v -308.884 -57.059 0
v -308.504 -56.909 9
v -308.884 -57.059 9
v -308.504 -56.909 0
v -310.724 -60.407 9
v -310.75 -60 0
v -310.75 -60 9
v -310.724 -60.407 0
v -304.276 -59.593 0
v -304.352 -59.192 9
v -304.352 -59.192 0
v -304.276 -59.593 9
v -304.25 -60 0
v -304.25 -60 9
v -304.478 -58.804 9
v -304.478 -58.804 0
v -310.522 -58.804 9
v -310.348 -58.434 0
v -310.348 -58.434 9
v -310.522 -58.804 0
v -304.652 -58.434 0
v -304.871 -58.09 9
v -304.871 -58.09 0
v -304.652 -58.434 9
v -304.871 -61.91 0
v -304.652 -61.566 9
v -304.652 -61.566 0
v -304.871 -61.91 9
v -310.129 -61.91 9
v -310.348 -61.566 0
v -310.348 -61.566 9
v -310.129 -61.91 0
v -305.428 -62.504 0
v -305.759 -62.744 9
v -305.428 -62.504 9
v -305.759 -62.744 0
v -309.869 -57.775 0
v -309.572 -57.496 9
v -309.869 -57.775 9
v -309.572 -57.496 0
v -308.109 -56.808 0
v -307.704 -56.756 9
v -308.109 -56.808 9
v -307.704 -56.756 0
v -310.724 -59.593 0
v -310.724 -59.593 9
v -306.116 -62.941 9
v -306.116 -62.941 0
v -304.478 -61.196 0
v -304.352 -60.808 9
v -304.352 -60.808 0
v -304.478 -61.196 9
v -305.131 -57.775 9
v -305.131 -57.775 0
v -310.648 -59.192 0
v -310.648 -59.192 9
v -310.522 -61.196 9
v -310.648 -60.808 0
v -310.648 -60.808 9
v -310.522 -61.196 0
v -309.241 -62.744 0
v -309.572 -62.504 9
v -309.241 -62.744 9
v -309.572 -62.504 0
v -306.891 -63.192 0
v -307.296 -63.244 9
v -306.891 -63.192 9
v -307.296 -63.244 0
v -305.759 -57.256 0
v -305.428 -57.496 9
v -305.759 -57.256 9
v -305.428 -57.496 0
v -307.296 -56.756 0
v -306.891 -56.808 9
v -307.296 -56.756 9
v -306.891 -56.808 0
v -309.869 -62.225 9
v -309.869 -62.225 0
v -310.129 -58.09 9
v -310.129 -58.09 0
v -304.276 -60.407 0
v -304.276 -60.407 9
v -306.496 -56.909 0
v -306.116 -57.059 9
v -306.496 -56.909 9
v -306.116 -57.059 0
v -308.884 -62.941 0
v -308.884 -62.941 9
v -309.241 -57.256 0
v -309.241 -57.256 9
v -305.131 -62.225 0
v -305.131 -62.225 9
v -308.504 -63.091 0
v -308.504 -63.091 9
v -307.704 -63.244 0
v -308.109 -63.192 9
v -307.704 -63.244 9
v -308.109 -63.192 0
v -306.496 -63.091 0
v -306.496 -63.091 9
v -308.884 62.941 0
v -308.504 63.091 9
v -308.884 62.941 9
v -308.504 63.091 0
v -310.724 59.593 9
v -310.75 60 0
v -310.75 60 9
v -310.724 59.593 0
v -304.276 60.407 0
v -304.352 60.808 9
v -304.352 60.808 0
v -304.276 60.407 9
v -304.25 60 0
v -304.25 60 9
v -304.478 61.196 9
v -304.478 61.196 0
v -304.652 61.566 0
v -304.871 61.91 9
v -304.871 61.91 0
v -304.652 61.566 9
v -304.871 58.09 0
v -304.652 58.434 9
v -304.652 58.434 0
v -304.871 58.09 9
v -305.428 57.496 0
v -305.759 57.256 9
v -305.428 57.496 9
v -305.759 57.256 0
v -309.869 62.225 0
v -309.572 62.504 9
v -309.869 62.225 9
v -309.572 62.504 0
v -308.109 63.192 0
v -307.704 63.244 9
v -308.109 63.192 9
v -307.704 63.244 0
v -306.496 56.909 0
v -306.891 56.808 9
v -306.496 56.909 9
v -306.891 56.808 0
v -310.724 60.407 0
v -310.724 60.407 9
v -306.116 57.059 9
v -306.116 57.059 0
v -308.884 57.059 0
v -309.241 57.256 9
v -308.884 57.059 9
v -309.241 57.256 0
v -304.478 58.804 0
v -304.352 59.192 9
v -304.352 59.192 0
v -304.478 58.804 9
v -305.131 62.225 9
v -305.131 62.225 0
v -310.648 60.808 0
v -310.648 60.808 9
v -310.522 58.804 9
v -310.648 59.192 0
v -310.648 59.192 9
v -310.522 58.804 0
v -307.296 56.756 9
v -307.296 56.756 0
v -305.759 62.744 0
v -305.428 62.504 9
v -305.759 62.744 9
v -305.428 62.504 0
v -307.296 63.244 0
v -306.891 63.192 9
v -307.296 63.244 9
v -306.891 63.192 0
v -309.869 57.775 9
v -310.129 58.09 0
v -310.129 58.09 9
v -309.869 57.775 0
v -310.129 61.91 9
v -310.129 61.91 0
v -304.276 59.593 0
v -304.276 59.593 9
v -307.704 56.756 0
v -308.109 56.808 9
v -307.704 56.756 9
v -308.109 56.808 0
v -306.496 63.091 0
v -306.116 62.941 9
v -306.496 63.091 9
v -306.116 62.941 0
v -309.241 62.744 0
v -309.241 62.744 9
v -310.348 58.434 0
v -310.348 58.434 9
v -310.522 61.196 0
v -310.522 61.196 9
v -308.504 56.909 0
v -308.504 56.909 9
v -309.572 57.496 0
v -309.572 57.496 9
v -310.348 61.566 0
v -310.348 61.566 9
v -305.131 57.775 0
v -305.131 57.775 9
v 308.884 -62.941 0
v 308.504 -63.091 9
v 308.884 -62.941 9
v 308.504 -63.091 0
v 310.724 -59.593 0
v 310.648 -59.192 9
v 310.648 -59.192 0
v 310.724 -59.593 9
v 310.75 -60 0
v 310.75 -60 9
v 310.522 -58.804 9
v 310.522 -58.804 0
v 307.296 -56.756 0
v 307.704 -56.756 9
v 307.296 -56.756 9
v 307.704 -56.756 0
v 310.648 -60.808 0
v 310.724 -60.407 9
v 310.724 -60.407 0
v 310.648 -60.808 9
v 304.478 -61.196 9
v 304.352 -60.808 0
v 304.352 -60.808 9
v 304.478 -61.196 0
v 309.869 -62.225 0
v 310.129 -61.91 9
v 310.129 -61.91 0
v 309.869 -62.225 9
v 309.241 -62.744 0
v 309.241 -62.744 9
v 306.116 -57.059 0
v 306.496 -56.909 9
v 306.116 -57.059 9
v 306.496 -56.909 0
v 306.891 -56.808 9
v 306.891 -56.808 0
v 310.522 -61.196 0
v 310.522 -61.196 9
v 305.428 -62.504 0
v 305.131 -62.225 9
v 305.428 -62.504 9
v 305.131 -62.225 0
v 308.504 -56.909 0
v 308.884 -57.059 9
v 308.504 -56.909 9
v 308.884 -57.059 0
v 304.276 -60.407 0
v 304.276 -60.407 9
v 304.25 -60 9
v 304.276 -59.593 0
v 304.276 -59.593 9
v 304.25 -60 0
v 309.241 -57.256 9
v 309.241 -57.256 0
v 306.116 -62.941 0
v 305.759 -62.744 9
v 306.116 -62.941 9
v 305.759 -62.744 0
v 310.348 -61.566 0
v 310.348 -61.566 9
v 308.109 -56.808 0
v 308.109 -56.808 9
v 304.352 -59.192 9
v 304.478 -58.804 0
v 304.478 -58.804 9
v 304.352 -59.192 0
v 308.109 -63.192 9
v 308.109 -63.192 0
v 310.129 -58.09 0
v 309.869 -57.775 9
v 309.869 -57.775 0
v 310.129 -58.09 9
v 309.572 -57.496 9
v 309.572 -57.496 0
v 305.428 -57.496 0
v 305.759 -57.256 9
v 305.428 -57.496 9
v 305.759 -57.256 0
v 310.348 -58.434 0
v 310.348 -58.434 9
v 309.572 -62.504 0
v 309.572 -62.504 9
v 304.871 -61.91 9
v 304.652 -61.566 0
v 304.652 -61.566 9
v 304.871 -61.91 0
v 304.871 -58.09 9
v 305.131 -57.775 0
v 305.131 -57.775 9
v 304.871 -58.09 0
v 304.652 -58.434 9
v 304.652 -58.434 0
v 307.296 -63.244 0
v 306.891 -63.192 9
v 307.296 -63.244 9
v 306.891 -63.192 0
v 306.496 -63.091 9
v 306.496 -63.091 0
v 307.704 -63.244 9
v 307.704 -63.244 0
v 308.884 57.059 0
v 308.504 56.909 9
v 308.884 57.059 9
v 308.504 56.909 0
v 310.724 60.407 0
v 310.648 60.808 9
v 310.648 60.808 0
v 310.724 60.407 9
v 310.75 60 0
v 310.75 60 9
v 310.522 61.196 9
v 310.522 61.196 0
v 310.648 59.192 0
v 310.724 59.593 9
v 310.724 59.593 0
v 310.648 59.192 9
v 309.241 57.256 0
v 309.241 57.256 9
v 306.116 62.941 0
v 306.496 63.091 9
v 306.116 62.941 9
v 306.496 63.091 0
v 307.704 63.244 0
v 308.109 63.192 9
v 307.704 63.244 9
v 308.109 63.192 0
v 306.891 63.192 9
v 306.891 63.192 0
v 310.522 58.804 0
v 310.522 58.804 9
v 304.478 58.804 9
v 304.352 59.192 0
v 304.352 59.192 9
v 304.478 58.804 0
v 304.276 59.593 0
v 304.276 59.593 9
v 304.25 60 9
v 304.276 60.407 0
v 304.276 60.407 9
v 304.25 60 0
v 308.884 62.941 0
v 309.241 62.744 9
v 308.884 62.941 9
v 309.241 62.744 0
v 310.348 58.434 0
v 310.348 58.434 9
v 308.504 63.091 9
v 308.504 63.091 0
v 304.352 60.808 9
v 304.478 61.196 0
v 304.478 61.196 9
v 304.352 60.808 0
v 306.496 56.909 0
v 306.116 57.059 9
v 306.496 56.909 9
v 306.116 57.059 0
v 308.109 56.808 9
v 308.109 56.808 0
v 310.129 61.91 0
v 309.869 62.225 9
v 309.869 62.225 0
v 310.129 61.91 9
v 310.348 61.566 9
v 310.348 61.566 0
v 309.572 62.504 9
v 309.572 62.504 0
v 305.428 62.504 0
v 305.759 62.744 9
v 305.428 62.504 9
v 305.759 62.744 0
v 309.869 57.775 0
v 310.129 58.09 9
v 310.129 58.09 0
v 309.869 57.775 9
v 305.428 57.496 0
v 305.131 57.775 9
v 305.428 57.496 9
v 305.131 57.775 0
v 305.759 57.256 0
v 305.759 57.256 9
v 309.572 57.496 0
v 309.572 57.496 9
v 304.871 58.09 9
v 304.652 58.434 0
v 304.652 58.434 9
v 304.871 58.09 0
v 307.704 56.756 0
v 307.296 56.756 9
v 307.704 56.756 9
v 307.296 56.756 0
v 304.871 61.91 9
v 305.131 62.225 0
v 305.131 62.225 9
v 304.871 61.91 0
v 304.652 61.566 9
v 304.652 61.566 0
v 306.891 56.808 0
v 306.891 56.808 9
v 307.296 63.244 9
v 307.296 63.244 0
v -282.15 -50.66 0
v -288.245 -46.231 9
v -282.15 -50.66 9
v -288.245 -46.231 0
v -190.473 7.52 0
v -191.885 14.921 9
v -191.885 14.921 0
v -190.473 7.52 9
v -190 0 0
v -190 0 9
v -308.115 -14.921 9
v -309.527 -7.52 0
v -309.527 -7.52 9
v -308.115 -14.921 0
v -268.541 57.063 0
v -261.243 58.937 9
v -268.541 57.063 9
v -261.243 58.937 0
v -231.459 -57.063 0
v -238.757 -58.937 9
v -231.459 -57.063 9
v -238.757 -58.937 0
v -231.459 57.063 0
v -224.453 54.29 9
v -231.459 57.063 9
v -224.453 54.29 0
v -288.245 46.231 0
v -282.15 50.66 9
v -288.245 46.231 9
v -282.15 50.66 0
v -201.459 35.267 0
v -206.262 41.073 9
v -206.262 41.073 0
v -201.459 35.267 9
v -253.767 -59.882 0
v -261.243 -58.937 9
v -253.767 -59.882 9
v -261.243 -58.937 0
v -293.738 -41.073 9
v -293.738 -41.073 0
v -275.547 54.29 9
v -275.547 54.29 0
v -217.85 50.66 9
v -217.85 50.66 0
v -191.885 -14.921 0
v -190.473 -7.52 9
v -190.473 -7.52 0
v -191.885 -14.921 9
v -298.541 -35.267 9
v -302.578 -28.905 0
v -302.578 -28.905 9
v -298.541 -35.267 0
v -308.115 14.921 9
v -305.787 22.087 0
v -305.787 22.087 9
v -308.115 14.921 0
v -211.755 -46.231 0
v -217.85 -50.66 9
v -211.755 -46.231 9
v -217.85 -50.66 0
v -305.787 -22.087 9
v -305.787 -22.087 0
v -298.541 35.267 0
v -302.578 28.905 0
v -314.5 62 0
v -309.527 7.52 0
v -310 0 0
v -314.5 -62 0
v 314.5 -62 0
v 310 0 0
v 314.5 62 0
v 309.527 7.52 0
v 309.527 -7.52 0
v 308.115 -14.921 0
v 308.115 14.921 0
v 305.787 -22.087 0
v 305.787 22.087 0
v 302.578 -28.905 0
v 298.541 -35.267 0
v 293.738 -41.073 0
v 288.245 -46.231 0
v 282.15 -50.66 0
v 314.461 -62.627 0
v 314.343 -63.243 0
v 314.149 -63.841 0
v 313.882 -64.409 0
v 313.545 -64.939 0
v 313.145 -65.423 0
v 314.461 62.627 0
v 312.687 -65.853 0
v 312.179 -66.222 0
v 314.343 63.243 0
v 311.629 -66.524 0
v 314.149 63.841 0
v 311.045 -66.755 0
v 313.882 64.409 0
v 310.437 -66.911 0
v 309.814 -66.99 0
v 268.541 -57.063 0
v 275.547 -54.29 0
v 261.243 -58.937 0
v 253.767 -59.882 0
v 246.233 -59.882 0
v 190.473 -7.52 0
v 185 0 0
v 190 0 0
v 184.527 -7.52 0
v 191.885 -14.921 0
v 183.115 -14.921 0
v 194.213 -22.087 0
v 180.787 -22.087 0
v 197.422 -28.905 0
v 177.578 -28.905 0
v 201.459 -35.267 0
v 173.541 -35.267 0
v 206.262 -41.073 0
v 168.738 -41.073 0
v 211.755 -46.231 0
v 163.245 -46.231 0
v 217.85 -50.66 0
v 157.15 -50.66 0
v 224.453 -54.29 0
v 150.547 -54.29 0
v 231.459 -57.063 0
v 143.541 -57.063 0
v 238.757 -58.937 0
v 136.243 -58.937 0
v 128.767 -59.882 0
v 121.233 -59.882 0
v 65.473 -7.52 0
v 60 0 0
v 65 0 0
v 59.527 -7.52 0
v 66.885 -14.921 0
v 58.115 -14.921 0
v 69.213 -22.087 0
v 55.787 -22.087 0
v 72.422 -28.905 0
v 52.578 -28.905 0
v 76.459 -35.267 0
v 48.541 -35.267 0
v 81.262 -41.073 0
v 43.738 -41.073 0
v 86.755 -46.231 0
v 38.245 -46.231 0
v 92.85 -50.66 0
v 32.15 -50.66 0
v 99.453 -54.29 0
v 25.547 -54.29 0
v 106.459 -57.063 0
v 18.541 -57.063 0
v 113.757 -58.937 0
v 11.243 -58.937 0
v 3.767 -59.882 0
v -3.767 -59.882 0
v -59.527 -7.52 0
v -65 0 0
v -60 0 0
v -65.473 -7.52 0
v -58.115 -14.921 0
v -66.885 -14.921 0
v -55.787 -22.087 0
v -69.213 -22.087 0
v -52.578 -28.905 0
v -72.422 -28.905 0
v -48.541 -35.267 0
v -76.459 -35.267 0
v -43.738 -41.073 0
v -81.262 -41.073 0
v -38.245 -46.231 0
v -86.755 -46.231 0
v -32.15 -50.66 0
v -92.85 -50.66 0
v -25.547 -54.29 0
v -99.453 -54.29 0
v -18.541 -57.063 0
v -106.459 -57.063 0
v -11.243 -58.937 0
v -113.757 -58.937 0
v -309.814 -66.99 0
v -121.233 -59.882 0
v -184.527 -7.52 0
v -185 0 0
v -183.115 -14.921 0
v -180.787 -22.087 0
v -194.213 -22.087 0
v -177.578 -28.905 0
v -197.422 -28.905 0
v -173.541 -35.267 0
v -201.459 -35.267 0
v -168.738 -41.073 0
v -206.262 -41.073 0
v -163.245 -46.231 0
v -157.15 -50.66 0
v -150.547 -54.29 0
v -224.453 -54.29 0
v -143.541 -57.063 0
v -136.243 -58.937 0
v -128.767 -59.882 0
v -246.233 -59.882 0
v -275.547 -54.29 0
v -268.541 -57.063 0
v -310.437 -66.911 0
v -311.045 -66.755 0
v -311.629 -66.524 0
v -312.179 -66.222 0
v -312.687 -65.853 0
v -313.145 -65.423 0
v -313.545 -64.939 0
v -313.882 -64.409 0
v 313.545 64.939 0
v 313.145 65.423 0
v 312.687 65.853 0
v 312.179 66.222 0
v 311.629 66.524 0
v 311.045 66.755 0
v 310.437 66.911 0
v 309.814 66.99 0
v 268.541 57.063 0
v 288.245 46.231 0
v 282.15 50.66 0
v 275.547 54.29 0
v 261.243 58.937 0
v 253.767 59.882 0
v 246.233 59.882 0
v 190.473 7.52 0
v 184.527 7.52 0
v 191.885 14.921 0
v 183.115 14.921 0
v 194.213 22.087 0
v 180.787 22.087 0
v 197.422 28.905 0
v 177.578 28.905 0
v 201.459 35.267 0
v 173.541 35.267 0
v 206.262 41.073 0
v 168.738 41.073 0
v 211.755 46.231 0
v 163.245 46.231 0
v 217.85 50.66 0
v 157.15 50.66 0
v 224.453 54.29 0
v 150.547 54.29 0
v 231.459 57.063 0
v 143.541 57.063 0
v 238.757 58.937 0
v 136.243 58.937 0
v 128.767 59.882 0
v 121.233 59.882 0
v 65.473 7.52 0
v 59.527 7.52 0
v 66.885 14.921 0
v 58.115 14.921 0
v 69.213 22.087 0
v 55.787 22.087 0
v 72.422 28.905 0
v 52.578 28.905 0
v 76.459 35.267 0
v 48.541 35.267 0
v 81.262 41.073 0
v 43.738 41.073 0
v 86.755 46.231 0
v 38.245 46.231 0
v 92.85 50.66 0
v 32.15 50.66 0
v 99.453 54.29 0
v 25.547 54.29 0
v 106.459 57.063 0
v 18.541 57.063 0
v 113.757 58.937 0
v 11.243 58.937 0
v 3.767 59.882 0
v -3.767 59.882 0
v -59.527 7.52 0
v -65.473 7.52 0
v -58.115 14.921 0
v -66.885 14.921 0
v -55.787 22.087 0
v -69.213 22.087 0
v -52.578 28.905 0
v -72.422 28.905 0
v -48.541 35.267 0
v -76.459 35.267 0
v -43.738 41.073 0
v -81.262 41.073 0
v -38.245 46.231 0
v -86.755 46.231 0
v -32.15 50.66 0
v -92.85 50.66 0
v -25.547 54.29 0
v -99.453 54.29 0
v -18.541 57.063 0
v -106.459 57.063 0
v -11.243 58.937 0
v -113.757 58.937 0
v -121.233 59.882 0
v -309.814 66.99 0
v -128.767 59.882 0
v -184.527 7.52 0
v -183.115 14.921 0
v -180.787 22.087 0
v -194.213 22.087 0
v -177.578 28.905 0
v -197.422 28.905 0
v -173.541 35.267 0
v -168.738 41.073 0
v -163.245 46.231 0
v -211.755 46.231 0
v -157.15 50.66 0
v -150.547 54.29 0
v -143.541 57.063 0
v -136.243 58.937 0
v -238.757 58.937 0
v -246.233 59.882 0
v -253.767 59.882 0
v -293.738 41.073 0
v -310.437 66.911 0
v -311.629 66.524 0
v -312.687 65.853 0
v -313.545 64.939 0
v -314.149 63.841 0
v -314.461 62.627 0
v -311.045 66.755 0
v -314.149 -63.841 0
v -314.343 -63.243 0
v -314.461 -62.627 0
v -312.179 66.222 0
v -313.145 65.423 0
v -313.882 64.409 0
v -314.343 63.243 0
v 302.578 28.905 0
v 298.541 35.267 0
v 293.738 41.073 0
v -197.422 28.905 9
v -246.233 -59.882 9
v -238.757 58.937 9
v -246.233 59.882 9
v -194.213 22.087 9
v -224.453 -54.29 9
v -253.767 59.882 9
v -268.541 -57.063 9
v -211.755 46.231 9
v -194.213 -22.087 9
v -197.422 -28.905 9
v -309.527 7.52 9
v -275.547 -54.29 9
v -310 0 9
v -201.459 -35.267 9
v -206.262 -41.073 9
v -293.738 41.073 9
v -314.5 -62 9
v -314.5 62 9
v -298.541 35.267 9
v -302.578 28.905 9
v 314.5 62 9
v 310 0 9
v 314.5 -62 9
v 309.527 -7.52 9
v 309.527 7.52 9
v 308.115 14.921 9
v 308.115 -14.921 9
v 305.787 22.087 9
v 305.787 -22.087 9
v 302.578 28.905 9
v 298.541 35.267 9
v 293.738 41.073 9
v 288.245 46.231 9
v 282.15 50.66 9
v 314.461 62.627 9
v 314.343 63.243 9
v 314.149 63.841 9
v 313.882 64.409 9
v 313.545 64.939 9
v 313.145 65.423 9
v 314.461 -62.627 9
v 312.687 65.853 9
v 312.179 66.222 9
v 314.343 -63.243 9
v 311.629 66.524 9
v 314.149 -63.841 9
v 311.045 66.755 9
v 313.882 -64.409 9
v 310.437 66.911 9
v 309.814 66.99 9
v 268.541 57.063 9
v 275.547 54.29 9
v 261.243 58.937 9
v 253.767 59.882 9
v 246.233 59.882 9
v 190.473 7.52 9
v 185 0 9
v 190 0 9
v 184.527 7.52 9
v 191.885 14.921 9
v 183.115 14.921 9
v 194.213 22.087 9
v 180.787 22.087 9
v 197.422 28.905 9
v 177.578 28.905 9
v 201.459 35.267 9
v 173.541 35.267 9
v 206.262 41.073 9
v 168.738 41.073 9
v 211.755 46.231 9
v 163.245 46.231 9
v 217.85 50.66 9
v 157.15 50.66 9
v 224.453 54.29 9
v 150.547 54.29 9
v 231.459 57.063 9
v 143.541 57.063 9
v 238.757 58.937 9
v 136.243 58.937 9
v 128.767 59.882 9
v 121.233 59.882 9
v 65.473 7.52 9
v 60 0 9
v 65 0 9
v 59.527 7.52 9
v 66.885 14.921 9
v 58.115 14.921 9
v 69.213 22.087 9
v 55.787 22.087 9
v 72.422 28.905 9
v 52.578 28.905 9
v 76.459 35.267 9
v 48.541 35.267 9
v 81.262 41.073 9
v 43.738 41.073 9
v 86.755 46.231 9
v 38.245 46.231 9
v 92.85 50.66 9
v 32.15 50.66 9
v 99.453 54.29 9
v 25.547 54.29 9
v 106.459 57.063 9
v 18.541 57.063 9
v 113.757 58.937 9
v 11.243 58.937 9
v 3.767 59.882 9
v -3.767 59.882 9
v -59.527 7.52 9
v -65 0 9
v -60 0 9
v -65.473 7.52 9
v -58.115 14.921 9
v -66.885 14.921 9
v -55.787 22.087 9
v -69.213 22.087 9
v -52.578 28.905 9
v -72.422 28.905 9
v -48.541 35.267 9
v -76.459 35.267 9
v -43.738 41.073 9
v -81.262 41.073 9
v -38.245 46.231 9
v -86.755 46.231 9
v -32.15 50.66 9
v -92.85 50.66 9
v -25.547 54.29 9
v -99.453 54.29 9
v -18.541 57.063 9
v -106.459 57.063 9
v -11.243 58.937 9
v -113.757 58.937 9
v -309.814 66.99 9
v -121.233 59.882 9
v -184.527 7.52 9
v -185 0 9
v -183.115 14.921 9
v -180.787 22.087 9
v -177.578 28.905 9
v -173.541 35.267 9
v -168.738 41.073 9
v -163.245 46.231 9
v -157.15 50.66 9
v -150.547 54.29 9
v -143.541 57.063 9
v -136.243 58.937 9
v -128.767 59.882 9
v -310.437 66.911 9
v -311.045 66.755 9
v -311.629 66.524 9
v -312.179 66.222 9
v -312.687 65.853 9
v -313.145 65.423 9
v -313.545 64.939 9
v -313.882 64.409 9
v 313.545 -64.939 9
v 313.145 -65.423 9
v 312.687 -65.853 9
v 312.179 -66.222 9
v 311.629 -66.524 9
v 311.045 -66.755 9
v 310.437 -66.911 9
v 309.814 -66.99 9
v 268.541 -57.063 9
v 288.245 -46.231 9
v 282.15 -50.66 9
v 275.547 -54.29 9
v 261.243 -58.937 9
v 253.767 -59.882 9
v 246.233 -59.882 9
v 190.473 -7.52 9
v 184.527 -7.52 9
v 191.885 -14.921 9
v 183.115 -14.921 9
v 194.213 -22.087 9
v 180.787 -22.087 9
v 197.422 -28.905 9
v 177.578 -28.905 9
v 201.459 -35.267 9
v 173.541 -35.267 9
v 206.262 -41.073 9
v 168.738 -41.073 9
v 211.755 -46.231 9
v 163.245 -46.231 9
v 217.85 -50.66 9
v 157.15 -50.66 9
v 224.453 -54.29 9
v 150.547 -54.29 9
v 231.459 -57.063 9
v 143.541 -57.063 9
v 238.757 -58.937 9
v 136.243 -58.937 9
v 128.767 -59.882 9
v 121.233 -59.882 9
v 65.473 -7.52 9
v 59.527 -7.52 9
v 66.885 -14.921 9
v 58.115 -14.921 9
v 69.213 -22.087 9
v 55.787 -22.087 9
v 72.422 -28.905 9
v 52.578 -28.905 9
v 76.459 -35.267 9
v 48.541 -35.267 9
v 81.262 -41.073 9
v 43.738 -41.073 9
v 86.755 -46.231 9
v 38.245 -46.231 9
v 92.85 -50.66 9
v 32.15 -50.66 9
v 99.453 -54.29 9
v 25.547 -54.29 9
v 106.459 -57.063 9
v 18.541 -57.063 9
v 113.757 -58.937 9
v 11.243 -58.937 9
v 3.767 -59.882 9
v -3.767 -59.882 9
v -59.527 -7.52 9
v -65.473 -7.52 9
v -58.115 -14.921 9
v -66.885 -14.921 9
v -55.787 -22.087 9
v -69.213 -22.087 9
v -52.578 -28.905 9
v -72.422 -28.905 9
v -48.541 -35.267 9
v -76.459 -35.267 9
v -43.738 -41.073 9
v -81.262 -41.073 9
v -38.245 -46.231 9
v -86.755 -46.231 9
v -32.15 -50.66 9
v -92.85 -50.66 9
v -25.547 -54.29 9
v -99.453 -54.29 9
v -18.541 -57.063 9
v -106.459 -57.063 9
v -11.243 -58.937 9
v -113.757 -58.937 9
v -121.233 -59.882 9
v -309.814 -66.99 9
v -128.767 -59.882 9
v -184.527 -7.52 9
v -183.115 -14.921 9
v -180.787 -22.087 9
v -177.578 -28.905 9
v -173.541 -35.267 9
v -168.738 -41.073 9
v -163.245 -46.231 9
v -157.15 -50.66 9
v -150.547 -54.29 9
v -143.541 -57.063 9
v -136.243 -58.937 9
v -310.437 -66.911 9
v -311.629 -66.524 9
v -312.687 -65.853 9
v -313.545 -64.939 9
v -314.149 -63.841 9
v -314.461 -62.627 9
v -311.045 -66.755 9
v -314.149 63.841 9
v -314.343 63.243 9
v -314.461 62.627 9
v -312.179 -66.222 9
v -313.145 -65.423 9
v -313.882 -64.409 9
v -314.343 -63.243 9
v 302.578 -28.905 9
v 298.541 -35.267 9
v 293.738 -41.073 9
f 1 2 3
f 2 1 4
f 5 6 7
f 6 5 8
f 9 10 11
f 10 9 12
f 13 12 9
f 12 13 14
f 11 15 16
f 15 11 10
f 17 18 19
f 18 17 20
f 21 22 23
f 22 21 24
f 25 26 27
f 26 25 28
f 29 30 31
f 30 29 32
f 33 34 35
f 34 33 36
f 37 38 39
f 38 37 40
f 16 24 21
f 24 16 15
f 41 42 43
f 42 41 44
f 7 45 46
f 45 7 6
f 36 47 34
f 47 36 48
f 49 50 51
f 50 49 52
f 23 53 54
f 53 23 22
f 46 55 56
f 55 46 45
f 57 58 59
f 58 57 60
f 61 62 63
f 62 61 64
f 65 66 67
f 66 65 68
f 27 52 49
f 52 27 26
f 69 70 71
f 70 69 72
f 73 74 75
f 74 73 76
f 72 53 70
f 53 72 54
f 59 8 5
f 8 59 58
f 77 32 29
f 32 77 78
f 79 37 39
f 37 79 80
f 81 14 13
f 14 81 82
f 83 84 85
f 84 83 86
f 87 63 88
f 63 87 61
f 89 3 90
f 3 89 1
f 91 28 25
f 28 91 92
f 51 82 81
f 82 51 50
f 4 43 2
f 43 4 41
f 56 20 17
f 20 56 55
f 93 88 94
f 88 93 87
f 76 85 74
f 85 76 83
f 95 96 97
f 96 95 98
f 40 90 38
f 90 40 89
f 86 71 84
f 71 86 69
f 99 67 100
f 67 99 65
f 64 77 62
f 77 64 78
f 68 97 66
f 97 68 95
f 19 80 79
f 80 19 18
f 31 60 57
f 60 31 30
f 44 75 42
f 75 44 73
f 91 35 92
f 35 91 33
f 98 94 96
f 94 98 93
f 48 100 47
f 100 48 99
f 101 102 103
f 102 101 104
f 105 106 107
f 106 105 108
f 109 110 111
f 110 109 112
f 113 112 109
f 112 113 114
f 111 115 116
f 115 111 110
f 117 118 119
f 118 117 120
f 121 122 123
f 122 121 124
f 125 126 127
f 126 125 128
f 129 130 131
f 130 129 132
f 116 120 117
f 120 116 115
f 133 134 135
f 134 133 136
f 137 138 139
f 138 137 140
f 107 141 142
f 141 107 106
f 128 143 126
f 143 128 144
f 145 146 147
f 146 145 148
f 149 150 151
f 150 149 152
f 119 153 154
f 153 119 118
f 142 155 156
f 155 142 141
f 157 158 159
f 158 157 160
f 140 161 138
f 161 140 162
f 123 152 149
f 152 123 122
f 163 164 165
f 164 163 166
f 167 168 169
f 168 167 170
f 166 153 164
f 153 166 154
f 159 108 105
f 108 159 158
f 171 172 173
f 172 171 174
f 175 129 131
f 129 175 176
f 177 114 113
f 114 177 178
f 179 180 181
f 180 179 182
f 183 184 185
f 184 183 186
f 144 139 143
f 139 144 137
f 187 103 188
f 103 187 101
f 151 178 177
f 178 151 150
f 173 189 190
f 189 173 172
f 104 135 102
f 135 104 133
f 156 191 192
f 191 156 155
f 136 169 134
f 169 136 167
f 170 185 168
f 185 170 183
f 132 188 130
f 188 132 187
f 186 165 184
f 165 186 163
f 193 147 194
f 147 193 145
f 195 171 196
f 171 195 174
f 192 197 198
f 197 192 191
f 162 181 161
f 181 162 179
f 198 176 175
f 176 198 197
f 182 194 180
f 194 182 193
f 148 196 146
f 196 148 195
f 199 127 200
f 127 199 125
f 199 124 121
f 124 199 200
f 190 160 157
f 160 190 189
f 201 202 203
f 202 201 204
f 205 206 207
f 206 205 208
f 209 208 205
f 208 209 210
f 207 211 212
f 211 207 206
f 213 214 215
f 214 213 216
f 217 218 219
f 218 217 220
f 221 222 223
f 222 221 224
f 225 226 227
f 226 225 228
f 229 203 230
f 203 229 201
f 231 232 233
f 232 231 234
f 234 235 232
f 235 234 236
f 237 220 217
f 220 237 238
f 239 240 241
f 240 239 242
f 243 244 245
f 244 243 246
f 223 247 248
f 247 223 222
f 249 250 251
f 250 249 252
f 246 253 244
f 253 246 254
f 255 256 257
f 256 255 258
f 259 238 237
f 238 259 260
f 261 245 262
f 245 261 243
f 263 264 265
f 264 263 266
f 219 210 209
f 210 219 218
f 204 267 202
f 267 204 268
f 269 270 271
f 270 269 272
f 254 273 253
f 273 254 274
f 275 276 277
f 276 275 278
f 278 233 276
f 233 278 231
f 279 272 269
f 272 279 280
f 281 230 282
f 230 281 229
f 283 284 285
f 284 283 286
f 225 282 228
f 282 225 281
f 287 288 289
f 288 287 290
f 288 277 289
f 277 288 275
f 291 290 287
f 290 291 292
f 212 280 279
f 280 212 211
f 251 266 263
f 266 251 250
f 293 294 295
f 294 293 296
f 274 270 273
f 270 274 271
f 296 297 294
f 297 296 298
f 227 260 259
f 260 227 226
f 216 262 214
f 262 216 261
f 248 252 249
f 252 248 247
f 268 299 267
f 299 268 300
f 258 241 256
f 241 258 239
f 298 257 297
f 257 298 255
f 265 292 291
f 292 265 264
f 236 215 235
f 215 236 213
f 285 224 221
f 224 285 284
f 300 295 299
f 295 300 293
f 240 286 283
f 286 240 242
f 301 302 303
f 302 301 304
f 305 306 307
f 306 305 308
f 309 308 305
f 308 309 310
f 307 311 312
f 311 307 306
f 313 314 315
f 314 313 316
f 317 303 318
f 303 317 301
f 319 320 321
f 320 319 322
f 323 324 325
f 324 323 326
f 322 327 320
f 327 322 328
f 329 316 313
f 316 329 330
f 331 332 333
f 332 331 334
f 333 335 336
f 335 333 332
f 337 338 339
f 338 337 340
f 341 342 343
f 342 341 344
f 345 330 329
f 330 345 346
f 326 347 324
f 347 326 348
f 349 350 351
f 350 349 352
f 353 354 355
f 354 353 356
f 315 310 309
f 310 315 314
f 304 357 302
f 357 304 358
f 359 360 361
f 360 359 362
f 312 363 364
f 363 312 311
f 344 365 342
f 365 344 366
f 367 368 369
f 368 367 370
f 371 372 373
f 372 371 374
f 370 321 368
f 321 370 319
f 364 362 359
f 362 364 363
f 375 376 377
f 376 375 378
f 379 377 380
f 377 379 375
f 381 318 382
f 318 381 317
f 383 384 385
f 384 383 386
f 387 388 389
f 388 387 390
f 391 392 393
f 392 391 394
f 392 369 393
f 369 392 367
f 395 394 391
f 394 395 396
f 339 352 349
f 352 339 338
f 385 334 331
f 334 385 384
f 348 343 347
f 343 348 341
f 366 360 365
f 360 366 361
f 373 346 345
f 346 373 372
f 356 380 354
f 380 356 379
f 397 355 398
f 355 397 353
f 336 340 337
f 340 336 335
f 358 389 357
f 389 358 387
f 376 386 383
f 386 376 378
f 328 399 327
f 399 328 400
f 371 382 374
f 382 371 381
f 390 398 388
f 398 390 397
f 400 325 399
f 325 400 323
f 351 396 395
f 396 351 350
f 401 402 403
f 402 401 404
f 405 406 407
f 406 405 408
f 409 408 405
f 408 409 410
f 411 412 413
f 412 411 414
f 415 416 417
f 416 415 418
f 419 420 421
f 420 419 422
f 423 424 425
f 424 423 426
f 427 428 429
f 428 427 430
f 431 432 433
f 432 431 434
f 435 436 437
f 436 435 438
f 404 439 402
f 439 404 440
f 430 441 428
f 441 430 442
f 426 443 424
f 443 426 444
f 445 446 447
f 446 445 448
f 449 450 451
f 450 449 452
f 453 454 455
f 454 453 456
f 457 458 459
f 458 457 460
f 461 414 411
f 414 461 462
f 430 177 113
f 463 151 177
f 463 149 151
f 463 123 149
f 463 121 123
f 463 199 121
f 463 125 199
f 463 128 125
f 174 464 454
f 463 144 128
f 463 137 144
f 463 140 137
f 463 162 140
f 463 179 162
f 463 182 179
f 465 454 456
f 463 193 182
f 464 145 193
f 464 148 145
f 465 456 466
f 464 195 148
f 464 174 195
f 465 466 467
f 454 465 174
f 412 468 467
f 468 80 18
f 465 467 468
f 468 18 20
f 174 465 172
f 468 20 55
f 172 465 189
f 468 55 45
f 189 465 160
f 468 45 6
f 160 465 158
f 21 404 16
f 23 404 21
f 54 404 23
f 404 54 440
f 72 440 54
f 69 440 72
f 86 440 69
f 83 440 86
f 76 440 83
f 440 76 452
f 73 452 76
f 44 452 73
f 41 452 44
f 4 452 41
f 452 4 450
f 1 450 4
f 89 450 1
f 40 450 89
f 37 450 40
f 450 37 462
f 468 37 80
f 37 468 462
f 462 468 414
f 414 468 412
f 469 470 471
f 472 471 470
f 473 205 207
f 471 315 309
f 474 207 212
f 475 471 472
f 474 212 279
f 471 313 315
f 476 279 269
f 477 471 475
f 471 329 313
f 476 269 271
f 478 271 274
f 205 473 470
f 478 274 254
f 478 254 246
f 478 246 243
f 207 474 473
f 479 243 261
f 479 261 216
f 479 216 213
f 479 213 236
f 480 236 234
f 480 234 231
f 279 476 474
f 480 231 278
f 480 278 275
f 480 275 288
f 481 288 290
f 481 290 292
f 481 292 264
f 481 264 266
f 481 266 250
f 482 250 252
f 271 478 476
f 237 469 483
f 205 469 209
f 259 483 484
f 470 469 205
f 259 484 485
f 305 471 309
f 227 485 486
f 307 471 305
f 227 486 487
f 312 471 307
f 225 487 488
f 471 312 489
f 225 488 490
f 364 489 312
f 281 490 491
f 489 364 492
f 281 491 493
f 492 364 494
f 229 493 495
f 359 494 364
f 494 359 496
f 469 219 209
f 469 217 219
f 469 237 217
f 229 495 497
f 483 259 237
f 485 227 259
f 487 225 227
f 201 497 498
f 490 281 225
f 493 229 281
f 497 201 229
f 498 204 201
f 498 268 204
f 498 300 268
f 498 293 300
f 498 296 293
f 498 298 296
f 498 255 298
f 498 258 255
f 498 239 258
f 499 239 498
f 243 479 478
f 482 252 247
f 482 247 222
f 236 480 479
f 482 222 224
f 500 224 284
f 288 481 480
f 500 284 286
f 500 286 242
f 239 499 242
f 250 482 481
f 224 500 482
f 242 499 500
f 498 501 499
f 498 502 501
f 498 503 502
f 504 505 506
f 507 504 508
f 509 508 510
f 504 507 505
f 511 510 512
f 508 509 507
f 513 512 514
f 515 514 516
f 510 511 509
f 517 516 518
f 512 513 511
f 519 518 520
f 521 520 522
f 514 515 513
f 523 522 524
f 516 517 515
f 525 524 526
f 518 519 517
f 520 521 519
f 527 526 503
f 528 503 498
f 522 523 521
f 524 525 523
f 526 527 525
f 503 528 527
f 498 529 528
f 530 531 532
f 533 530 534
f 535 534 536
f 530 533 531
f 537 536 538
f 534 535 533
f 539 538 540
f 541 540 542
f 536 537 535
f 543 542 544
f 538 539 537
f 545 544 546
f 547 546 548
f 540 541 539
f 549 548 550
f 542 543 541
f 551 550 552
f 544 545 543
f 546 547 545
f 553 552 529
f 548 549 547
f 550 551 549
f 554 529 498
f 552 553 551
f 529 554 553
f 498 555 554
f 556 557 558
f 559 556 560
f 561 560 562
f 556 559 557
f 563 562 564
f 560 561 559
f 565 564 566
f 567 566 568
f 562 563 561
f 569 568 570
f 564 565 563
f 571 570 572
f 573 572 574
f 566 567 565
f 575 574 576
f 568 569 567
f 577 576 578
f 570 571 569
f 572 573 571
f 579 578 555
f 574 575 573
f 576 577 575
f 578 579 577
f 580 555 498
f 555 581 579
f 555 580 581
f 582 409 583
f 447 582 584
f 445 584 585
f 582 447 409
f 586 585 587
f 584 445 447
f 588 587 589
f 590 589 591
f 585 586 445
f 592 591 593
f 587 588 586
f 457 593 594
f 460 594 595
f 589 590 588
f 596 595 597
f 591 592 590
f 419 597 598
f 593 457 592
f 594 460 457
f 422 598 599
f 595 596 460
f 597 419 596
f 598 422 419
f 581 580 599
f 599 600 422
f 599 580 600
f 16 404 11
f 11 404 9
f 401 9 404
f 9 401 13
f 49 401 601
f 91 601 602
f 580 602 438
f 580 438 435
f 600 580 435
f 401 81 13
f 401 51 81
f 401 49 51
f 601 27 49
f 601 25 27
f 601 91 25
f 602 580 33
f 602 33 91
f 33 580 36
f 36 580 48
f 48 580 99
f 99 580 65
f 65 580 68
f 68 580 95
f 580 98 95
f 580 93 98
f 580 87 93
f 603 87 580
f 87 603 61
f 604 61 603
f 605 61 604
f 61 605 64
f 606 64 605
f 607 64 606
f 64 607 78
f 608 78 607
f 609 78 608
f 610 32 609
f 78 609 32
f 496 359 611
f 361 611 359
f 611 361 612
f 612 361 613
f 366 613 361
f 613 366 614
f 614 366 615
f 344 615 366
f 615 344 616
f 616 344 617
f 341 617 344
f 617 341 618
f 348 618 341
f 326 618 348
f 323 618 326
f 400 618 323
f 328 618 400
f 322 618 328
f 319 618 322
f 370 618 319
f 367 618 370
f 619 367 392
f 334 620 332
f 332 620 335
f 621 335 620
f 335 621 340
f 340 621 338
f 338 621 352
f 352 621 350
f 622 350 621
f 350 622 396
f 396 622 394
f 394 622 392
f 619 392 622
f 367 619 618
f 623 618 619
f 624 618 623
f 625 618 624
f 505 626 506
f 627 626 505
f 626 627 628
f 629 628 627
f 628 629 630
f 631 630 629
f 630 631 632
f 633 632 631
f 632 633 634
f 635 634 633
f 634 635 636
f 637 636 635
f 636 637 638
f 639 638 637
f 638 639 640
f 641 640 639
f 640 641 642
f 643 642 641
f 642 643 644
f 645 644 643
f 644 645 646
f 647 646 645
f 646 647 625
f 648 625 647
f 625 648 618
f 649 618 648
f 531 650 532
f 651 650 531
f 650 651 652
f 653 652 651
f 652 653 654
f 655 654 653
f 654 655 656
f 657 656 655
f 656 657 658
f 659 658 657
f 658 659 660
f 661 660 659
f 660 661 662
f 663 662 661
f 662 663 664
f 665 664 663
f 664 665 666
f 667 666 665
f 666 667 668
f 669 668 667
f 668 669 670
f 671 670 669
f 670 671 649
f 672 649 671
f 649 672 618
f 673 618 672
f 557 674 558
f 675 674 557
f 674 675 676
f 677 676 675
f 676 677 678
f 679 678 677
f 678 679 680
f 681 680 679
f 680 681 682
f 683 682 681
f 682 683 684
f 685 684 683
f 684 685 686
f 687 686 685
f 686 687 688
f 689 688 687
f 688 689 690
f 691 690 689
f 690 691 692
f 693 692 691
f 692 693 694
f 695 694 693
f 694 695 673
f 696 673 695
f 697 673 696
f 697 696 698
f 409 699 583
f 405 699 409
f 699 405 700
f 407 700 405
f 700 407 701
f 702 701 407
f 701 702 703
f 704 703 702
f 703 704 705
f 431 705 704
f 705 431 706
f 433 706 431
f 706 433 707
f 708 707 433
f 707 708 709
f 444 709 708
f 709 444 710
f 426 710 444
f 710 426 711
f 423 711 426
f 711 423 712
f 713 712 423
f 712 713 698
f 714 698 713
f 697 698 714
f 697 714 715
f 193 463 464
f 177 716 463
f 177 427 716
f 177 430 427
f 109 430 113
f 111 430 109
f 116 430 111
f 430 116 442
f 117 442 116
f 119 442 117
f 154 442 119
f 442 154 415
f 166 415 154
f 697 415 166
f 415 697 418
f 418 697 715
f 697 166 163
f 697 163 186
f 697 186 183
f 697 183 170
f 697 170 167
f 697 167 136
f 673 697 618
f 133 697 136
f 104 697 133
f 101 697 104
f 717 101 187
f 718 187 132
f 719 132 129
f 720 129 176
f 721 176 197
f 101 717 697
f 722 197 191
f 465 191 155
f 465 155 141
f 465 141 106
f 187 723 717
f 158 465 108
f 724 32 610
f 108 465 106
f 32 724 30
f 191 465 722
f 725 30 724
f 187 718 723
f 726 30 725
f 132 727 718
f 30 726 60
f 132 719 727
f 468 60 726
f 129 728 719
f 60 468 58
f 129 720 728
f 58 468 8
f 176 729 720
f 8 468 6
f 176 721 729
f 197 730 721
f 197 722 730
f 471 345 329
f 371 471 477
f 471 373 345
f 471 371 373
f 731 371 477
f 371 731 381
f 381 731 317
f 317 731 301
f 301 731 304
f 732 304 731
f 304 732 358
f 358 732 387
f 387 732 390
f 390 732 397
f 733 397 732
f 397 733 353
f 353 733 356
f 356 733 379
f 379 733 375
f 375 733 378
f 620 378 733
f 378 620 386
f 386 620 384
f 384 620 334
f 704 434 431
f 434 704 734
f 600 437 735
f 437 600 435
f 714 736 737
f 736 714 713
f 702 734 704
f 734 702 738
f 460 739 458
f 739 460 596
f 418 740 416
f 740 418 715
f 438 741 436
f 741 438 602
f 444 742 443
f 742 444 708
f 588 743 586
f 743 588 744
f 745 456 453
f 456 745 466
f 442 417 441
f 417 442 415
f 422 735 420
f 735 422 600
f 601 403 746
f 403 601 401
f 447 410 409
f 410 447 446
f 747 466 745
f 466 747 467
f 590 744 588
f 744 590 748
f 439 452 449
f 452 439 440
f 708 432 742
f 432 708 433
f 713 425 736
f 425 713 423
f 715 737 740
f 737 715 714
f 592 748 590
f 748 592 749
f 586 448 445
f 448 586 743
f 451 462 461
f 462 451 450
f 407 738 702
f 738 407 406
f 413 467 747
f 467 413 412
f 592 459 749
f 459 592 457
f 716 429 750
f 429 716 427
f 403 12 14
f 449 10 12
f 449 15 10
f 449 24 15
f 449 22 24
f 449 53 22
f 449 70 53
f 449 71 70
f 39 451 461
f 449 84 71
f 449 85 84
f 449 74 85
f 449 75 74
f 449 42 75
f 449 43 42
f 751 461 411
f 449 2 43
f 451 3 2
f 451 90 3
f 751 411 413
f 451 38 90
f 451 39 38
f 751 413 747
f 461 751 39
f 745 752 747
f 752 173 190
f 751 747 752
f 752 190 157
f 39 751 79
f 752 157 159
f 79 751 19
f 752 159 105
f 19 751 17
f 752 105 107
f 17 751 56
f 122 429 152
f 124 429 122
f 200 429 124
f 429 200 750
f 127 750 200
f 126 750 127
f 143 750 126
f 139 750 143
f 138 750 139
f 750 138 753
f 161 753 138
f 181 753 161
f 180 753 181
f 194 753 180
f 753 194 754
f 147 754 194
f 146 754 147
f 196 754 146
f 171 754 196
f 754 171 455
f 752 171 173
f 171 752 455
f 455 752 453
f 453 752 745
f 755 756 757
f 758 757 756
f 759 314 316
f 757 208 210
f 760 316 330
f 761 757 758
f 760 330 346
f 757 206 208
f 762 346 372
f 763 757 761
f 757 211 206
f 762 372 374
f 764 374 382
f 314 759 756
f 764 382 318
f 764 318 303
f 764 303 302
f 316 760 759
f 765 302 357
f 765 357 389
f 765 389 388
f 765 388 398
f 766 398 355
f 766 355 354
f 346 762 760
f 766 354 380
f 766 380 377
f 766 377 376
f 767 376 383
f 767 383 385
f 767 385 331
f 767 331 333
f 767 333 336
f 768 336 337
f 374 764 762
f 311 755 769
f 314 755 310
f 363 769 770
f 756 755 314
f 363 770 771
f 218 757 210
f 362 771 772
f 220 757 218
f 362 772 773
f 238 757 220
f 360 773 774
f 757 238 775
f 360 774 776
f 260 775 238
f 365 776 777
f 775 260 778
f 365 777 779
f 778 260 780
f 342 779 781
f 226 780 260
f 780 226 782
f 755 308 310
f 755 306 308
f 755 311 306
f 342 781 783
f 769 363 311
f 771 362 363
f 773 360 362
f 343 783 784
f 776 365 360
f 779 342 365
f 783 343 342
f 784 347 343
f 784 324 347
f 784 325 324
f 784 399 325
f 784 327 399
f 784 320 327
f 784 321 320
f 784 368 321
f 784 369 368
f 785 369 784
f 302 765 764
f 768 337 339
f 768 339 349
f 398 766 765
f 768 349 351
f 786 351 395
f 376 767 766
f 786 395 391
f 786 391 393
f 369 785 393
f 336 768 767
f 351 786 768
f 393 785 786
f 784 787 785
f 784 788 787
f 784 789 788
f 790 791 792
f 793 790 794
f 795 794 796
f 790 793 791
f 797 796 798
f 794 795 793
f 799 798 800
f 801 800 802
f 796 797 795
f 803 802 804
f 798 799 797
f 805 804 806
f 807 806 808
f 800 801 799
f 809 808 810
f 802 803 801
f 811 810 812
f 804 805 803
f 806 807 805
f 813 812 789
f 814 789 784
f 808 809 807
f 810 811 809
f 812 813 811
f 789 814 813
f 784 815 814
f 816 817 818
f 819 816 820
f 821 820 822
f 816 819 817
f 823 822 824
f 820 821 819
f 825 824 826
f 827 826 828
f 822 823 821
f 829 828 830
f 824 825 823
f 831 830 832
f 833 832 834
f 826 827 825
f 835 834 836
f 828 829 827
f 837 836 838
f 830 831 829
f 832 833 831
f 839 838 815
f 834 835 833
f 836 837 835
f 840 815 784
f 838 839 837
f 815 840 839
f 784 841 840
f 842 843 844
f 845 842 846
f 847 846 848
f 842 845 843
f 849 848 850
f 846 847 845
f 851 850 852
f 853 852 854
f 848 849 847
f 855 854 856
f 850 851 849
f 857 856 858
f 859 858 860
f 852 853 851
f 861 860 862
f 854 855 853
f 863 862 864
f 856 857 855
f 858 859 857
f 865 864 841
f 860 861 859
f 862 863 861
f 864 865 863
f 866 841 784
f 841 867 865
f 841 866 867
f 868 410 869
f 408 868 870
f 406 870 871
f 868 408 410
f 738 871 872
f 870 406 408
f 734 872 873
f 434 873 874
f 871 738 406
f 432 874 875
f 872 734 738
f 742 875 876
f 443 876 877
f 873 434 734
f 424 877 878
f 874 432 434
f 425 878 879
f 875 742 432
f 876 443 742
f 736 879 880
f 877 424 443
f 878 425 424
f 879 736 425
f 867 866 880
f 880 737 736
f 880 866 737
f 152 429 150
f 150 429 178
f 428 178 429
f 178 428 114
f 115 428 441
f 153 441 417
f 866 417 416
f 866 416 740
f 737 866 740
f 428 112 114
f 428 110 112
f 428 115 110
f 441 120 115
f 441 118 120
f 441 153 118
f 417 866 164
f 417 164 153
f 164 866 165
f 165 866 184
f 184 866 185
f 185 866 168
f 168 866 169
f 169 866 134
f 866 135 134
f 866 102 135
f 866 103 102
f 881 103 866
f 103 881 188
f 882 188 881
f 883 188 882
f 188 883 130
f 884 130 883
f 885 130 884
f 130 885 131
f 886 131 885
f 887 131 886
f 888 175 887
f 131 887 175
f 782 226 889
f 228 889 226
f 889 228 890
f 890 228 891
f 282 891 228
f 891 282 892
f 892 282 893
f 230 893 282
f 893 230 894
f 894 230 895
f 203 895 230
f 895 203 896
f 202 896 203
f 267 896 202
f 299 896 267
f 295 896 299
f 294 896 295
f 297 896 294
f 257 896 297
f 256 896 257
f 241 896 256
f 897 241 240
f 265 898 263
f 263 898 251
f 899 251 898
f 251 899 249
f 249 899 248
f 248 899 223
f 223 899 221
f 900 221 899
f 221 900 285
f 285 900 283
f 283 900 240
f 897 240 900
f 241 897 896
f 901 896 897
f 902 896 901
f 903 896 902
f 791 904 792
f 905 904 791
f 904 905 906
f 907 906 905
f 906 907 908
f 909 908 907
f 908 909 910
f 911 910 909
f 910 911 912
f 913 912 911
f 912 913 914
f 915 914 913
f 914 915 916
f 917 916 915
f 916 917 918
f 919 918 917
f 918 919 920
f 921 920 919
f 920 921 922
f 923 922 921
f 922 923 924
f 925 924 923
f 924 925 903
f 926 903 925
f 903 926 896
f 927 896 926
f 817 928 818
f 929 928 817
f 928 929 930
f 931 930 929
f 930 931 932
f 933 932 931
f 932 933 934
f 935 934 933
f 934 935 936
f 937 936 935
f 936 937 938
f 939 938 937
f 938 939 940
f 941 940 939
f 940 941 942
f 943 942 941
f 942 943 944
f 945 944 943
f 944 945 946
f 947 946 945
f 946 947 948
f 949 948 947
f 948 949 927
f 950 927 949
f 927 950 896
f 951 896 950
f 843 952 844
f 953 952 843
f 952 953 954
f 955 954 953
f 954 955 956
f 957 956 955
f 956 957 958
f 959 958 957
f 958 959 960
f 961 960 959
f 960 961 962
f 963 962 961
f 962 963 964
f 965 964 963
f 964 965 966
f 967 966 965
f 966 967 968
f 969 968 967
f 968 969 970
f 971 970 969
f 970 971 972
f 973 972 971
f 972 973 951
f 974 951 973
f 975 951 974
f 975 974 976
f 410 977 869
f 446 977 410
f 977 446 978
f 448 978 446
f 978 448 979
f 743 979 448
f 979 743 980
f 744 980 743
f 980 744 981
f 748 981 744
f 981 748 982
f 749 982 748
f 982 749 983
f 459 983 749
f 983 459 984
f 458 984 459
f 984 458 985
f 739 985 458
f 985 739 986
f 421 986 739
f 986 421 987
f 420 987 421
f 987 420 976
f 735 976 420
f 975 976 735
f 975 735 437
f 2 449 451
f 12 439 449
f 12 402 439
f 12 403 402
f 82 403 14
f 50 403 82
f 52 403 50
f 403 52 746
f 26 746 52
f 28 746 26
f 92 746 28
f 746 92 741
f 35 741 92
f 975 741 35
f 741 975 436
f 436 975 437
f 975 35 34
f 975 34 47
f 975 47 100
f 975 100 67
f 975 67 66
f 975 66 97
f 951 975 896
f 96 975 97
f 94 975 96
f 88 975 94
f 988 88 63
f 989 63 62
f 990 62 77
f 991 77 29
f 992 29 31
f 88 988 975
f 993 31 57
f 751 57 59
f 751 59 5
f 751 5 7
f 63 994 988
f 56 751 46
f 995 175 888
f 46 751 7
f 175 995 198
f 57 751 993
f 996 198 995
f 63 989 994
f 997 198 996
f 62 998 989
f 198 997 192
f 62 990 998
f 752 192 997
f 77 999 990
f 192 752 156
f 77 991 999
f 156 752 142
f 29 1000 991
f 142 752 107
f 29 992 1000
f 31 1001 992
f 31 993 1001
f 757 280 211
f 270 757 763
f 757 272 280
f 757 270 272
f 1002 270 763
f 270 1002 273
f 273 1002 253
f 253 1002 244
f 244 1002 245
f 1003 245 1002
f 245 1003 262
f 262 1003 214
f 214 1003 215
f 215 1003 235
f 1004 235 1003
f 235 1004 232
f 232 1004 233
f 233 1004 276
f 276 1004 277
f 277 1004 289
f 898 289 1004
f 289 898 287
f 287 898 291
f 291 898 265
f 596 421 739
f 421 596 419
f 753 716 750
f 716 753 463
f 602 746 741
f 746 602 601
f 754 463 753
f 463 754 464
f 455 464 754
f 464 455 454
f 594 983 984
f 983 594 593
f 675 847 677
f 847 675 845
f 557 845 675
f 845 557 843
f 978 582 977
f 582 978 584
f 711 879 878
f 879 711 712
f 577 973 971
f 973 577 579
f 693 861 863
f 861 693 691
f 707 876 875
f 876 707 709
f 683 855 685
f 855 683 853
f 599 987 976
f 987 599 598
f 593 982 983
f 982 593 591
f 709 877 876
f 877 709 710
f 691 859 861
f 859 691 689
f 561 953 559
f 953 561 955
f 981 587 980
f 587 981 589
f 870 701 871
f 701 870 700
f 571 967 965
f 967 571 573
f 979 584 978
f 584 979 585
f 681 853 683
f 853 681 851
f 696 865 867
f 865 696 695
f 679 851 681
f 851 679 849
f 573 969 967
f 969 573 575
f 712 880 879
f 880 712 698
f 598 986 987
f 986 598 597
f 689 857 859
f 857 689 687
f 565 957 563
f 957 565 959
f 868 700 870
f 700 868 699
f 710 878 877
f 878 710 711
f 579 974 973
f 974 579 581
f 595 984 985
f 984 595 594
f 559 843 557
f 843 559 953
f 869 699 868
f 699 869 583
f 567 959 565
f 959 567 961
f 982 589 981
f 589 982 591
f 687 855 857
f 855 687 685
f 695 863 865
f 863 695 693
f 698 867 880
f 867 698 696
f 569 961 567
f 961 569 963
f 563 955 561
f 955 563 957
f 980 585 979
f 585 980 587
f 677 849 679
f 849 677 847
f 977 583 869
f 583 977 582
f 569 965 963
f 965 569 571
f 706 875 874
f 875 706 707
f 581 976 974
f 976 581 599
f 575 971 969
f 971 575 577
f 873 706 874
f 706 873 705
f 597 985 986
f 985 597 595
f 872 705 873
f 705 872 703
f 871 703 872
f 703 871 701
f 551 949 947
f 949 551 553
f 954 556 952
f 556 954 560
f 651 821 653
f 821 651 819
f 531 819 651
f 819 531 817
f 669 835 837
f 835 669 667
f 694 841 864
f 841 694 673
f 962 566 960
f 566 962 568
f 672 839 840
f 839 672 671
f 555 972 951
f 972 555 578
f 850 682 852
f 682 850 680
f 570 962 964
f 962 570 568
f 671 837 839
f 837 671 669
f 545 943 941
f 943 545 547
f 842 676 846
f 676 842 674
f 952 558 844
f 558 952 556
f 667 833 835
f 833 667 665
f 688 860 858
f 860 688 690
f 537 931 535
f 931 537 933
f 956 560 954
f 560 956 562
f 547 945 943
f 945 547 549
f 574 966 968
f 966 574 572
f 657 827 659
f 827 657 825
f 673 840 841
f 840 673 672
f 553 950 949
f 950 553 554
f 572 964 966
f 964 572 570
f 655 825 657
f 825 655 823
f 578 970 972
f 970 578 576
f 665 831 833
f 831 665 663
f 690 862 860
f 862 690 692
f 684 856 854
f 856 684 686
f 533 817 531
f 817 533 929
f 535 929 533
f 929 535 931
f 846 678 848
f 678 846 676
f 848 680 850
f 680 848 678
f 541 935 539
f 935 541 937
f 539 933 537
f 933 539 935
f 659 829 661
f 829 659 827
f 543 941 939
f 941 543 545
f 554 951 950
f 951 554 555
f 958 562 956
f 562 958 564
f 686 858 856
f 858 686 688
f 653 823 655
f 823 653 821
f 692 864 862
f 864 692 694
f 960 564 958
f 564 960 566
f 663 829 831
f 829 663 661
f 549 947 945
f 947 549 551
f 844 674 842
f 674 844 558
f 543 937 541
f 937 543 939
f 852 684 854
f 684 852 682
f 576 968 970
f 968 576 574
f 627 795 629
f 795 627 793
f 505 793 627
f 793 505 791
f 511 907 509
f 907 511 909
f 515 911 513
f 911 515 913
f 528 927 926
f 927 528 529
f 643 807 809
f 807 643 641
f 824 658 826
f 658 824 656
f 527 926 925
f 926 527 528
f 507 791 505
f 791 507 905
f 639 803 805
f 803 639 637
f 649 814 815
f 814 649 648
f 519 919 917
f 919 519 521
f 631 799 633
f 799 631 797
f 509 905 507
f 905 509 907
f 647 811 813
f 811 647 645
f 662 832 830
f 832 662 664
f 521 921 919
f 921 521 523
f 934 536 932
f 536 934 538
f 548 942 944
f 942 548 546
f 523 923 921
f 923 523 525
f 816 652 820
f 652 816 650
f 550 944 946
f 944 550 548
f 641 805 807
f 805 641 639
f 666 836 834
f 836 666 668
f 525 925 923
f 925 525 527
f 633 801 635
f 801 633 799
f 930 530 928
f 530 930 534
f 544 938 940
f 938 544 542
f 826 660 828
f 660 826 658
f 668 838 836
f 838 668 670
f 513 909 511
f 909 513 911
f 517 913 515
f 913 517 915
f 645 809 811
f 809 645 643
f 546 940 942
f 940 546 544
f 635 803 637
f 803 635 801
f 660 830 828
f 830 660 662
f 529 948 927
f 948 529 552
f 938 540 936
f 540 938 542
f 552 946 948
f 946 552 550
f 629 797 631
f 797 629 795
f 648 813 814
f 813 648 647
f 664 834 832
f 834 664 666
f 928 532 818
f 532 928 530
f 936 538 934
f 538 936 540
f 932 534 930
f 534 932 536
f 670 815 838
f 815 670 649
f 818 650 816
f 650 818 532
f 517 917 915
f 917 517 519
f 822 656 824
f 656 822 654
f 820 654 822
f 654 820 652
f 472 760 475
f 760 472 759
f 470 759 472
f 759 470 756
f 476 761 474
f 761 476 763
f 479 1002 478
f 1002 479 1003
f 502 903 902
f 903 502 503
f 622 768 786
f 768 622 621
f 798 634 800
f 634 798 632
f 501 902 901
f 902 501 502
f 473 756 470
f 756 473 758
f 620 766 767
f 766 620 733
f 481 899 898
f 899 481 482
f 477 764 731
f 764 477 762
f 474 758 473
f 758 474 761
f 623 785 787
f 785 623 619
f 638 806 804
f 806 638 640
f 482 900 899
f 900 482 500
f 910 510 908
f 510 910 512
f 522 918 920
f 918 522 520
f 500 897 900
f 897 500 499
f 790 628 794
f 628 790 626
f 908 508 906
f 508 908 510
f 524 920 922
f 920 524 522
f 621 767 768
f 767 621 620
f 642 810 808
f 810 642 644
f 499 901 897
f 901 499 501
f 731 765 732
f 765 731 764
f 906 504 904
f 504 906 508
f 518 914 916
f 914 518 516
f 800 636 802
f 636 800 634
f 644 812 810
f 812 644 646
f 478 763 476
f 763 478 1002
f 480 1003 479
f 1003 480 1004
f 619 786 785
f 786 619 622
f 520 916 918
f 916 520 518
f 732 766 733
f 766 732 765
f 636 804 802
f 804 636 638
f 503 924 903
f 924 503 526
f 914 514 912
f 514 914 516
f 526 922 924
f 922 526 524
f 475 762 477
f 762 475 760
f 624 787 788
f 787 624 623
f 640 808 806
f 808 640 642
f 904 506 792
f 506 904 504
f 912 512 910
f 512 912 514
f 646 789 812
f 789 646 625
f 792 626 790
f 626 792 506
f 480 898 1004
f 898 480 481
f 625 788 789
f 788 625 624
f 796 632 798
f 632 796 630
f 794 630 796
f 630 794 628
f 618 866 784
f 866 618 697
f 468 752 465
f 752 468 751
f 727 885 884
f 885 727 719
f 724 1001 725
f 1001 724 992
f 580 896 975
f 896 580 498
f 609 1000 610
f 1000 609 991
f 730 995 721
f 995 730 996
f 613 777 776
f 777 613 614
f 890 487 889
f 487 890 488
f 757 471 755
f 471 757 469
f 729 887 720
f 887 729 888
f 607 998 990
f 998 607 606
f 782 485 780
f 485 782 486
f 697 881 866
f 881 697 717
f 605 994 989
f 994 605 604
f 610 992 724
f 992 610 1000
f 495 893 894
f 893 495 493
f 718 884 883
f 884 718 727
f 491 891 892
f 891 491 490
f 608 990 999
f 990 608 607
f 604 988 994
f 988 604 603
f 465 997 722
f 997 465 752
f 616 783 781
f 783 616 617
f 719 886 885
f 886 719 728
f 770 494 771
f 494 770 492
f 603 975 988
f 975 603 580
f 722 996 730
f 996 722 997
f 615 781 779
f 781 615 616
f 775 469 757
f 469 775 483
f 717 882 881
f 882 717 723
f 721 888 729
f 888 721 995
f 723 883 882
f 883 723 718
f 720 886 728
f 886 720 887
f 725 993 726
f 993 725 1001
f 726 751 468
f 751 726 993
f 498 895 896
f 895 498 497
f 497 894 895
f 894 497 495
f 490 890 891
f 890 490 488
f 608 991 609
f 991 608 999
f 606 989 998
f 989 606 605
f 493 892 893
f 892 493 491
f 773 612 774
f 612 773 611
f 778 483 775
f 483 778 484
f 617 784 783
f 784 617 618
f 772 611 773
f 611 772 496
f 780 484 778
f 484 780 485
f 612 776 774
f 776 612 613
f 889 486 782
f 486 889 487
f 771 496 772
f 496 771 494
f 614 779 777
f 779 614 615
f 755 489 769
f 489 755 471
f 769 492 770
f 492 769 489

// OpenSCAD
$fn = 50;


difference() {
	union() {
		hull() {
			translate(v = [-309.5000000000, 62.0000000000, 0]) {
				cylinder(h = 9, r = 5);
			}
			translate(v = [309.5000000000, 62.0000000000, 0]) {
				cylinder(h = 9, r = 5);
			}
			translate(v = [-309.5000000000, -62.0000000000, 0]) {
				cylinder(h = 9, r = 5);
			}
			translate(v = [309.5000000000, -62.0000000000, 0]) {
				cylinder(h = 9, r = 5);
			}
		}
	}
	union() {
		#translate(v = [-307.5000000000, -60.0000000000, -100.0000000000]) {
			cylinder(h = 200, r = 3.2500000000);
		}
		#translate(v = [-307.5000000000, 60.0000000000, -100.0000000000]) {
			cylinder(h = 200, r = 3.2500000000);
		}
		#translate(v = [307.5000000000, -60.0000000000, -100.0000000000]) {
			cylinder(h = 200, r = 3.2500000000);
		}
		#translate(v = [307.5000000000, 60.0000000000, -100.0000000000]) {
			cylinder(h = 200, r = 3.2500000000);
		}
		#translate(v = [-250.0000000000, 0, 0]) {
			cylinder(h = 9, r = 60.0000000000);
		}
		#translate(v = [-125.0000000000, 0, 0]) {
			cylinder(h = 9, r = 60.0000000000);
		}
		#cylinder(h = 9, r = 60.0000000000);
		#translate(v = [125.0000000000, 0, 0]) {
			cylinder(h = 9, r = 60.0000000000);
		}
		#translate(v = [250.0000000000, 0, 0]) {
			cylinder(h = 9, r = 60.0000000000);
		}
	}
}
